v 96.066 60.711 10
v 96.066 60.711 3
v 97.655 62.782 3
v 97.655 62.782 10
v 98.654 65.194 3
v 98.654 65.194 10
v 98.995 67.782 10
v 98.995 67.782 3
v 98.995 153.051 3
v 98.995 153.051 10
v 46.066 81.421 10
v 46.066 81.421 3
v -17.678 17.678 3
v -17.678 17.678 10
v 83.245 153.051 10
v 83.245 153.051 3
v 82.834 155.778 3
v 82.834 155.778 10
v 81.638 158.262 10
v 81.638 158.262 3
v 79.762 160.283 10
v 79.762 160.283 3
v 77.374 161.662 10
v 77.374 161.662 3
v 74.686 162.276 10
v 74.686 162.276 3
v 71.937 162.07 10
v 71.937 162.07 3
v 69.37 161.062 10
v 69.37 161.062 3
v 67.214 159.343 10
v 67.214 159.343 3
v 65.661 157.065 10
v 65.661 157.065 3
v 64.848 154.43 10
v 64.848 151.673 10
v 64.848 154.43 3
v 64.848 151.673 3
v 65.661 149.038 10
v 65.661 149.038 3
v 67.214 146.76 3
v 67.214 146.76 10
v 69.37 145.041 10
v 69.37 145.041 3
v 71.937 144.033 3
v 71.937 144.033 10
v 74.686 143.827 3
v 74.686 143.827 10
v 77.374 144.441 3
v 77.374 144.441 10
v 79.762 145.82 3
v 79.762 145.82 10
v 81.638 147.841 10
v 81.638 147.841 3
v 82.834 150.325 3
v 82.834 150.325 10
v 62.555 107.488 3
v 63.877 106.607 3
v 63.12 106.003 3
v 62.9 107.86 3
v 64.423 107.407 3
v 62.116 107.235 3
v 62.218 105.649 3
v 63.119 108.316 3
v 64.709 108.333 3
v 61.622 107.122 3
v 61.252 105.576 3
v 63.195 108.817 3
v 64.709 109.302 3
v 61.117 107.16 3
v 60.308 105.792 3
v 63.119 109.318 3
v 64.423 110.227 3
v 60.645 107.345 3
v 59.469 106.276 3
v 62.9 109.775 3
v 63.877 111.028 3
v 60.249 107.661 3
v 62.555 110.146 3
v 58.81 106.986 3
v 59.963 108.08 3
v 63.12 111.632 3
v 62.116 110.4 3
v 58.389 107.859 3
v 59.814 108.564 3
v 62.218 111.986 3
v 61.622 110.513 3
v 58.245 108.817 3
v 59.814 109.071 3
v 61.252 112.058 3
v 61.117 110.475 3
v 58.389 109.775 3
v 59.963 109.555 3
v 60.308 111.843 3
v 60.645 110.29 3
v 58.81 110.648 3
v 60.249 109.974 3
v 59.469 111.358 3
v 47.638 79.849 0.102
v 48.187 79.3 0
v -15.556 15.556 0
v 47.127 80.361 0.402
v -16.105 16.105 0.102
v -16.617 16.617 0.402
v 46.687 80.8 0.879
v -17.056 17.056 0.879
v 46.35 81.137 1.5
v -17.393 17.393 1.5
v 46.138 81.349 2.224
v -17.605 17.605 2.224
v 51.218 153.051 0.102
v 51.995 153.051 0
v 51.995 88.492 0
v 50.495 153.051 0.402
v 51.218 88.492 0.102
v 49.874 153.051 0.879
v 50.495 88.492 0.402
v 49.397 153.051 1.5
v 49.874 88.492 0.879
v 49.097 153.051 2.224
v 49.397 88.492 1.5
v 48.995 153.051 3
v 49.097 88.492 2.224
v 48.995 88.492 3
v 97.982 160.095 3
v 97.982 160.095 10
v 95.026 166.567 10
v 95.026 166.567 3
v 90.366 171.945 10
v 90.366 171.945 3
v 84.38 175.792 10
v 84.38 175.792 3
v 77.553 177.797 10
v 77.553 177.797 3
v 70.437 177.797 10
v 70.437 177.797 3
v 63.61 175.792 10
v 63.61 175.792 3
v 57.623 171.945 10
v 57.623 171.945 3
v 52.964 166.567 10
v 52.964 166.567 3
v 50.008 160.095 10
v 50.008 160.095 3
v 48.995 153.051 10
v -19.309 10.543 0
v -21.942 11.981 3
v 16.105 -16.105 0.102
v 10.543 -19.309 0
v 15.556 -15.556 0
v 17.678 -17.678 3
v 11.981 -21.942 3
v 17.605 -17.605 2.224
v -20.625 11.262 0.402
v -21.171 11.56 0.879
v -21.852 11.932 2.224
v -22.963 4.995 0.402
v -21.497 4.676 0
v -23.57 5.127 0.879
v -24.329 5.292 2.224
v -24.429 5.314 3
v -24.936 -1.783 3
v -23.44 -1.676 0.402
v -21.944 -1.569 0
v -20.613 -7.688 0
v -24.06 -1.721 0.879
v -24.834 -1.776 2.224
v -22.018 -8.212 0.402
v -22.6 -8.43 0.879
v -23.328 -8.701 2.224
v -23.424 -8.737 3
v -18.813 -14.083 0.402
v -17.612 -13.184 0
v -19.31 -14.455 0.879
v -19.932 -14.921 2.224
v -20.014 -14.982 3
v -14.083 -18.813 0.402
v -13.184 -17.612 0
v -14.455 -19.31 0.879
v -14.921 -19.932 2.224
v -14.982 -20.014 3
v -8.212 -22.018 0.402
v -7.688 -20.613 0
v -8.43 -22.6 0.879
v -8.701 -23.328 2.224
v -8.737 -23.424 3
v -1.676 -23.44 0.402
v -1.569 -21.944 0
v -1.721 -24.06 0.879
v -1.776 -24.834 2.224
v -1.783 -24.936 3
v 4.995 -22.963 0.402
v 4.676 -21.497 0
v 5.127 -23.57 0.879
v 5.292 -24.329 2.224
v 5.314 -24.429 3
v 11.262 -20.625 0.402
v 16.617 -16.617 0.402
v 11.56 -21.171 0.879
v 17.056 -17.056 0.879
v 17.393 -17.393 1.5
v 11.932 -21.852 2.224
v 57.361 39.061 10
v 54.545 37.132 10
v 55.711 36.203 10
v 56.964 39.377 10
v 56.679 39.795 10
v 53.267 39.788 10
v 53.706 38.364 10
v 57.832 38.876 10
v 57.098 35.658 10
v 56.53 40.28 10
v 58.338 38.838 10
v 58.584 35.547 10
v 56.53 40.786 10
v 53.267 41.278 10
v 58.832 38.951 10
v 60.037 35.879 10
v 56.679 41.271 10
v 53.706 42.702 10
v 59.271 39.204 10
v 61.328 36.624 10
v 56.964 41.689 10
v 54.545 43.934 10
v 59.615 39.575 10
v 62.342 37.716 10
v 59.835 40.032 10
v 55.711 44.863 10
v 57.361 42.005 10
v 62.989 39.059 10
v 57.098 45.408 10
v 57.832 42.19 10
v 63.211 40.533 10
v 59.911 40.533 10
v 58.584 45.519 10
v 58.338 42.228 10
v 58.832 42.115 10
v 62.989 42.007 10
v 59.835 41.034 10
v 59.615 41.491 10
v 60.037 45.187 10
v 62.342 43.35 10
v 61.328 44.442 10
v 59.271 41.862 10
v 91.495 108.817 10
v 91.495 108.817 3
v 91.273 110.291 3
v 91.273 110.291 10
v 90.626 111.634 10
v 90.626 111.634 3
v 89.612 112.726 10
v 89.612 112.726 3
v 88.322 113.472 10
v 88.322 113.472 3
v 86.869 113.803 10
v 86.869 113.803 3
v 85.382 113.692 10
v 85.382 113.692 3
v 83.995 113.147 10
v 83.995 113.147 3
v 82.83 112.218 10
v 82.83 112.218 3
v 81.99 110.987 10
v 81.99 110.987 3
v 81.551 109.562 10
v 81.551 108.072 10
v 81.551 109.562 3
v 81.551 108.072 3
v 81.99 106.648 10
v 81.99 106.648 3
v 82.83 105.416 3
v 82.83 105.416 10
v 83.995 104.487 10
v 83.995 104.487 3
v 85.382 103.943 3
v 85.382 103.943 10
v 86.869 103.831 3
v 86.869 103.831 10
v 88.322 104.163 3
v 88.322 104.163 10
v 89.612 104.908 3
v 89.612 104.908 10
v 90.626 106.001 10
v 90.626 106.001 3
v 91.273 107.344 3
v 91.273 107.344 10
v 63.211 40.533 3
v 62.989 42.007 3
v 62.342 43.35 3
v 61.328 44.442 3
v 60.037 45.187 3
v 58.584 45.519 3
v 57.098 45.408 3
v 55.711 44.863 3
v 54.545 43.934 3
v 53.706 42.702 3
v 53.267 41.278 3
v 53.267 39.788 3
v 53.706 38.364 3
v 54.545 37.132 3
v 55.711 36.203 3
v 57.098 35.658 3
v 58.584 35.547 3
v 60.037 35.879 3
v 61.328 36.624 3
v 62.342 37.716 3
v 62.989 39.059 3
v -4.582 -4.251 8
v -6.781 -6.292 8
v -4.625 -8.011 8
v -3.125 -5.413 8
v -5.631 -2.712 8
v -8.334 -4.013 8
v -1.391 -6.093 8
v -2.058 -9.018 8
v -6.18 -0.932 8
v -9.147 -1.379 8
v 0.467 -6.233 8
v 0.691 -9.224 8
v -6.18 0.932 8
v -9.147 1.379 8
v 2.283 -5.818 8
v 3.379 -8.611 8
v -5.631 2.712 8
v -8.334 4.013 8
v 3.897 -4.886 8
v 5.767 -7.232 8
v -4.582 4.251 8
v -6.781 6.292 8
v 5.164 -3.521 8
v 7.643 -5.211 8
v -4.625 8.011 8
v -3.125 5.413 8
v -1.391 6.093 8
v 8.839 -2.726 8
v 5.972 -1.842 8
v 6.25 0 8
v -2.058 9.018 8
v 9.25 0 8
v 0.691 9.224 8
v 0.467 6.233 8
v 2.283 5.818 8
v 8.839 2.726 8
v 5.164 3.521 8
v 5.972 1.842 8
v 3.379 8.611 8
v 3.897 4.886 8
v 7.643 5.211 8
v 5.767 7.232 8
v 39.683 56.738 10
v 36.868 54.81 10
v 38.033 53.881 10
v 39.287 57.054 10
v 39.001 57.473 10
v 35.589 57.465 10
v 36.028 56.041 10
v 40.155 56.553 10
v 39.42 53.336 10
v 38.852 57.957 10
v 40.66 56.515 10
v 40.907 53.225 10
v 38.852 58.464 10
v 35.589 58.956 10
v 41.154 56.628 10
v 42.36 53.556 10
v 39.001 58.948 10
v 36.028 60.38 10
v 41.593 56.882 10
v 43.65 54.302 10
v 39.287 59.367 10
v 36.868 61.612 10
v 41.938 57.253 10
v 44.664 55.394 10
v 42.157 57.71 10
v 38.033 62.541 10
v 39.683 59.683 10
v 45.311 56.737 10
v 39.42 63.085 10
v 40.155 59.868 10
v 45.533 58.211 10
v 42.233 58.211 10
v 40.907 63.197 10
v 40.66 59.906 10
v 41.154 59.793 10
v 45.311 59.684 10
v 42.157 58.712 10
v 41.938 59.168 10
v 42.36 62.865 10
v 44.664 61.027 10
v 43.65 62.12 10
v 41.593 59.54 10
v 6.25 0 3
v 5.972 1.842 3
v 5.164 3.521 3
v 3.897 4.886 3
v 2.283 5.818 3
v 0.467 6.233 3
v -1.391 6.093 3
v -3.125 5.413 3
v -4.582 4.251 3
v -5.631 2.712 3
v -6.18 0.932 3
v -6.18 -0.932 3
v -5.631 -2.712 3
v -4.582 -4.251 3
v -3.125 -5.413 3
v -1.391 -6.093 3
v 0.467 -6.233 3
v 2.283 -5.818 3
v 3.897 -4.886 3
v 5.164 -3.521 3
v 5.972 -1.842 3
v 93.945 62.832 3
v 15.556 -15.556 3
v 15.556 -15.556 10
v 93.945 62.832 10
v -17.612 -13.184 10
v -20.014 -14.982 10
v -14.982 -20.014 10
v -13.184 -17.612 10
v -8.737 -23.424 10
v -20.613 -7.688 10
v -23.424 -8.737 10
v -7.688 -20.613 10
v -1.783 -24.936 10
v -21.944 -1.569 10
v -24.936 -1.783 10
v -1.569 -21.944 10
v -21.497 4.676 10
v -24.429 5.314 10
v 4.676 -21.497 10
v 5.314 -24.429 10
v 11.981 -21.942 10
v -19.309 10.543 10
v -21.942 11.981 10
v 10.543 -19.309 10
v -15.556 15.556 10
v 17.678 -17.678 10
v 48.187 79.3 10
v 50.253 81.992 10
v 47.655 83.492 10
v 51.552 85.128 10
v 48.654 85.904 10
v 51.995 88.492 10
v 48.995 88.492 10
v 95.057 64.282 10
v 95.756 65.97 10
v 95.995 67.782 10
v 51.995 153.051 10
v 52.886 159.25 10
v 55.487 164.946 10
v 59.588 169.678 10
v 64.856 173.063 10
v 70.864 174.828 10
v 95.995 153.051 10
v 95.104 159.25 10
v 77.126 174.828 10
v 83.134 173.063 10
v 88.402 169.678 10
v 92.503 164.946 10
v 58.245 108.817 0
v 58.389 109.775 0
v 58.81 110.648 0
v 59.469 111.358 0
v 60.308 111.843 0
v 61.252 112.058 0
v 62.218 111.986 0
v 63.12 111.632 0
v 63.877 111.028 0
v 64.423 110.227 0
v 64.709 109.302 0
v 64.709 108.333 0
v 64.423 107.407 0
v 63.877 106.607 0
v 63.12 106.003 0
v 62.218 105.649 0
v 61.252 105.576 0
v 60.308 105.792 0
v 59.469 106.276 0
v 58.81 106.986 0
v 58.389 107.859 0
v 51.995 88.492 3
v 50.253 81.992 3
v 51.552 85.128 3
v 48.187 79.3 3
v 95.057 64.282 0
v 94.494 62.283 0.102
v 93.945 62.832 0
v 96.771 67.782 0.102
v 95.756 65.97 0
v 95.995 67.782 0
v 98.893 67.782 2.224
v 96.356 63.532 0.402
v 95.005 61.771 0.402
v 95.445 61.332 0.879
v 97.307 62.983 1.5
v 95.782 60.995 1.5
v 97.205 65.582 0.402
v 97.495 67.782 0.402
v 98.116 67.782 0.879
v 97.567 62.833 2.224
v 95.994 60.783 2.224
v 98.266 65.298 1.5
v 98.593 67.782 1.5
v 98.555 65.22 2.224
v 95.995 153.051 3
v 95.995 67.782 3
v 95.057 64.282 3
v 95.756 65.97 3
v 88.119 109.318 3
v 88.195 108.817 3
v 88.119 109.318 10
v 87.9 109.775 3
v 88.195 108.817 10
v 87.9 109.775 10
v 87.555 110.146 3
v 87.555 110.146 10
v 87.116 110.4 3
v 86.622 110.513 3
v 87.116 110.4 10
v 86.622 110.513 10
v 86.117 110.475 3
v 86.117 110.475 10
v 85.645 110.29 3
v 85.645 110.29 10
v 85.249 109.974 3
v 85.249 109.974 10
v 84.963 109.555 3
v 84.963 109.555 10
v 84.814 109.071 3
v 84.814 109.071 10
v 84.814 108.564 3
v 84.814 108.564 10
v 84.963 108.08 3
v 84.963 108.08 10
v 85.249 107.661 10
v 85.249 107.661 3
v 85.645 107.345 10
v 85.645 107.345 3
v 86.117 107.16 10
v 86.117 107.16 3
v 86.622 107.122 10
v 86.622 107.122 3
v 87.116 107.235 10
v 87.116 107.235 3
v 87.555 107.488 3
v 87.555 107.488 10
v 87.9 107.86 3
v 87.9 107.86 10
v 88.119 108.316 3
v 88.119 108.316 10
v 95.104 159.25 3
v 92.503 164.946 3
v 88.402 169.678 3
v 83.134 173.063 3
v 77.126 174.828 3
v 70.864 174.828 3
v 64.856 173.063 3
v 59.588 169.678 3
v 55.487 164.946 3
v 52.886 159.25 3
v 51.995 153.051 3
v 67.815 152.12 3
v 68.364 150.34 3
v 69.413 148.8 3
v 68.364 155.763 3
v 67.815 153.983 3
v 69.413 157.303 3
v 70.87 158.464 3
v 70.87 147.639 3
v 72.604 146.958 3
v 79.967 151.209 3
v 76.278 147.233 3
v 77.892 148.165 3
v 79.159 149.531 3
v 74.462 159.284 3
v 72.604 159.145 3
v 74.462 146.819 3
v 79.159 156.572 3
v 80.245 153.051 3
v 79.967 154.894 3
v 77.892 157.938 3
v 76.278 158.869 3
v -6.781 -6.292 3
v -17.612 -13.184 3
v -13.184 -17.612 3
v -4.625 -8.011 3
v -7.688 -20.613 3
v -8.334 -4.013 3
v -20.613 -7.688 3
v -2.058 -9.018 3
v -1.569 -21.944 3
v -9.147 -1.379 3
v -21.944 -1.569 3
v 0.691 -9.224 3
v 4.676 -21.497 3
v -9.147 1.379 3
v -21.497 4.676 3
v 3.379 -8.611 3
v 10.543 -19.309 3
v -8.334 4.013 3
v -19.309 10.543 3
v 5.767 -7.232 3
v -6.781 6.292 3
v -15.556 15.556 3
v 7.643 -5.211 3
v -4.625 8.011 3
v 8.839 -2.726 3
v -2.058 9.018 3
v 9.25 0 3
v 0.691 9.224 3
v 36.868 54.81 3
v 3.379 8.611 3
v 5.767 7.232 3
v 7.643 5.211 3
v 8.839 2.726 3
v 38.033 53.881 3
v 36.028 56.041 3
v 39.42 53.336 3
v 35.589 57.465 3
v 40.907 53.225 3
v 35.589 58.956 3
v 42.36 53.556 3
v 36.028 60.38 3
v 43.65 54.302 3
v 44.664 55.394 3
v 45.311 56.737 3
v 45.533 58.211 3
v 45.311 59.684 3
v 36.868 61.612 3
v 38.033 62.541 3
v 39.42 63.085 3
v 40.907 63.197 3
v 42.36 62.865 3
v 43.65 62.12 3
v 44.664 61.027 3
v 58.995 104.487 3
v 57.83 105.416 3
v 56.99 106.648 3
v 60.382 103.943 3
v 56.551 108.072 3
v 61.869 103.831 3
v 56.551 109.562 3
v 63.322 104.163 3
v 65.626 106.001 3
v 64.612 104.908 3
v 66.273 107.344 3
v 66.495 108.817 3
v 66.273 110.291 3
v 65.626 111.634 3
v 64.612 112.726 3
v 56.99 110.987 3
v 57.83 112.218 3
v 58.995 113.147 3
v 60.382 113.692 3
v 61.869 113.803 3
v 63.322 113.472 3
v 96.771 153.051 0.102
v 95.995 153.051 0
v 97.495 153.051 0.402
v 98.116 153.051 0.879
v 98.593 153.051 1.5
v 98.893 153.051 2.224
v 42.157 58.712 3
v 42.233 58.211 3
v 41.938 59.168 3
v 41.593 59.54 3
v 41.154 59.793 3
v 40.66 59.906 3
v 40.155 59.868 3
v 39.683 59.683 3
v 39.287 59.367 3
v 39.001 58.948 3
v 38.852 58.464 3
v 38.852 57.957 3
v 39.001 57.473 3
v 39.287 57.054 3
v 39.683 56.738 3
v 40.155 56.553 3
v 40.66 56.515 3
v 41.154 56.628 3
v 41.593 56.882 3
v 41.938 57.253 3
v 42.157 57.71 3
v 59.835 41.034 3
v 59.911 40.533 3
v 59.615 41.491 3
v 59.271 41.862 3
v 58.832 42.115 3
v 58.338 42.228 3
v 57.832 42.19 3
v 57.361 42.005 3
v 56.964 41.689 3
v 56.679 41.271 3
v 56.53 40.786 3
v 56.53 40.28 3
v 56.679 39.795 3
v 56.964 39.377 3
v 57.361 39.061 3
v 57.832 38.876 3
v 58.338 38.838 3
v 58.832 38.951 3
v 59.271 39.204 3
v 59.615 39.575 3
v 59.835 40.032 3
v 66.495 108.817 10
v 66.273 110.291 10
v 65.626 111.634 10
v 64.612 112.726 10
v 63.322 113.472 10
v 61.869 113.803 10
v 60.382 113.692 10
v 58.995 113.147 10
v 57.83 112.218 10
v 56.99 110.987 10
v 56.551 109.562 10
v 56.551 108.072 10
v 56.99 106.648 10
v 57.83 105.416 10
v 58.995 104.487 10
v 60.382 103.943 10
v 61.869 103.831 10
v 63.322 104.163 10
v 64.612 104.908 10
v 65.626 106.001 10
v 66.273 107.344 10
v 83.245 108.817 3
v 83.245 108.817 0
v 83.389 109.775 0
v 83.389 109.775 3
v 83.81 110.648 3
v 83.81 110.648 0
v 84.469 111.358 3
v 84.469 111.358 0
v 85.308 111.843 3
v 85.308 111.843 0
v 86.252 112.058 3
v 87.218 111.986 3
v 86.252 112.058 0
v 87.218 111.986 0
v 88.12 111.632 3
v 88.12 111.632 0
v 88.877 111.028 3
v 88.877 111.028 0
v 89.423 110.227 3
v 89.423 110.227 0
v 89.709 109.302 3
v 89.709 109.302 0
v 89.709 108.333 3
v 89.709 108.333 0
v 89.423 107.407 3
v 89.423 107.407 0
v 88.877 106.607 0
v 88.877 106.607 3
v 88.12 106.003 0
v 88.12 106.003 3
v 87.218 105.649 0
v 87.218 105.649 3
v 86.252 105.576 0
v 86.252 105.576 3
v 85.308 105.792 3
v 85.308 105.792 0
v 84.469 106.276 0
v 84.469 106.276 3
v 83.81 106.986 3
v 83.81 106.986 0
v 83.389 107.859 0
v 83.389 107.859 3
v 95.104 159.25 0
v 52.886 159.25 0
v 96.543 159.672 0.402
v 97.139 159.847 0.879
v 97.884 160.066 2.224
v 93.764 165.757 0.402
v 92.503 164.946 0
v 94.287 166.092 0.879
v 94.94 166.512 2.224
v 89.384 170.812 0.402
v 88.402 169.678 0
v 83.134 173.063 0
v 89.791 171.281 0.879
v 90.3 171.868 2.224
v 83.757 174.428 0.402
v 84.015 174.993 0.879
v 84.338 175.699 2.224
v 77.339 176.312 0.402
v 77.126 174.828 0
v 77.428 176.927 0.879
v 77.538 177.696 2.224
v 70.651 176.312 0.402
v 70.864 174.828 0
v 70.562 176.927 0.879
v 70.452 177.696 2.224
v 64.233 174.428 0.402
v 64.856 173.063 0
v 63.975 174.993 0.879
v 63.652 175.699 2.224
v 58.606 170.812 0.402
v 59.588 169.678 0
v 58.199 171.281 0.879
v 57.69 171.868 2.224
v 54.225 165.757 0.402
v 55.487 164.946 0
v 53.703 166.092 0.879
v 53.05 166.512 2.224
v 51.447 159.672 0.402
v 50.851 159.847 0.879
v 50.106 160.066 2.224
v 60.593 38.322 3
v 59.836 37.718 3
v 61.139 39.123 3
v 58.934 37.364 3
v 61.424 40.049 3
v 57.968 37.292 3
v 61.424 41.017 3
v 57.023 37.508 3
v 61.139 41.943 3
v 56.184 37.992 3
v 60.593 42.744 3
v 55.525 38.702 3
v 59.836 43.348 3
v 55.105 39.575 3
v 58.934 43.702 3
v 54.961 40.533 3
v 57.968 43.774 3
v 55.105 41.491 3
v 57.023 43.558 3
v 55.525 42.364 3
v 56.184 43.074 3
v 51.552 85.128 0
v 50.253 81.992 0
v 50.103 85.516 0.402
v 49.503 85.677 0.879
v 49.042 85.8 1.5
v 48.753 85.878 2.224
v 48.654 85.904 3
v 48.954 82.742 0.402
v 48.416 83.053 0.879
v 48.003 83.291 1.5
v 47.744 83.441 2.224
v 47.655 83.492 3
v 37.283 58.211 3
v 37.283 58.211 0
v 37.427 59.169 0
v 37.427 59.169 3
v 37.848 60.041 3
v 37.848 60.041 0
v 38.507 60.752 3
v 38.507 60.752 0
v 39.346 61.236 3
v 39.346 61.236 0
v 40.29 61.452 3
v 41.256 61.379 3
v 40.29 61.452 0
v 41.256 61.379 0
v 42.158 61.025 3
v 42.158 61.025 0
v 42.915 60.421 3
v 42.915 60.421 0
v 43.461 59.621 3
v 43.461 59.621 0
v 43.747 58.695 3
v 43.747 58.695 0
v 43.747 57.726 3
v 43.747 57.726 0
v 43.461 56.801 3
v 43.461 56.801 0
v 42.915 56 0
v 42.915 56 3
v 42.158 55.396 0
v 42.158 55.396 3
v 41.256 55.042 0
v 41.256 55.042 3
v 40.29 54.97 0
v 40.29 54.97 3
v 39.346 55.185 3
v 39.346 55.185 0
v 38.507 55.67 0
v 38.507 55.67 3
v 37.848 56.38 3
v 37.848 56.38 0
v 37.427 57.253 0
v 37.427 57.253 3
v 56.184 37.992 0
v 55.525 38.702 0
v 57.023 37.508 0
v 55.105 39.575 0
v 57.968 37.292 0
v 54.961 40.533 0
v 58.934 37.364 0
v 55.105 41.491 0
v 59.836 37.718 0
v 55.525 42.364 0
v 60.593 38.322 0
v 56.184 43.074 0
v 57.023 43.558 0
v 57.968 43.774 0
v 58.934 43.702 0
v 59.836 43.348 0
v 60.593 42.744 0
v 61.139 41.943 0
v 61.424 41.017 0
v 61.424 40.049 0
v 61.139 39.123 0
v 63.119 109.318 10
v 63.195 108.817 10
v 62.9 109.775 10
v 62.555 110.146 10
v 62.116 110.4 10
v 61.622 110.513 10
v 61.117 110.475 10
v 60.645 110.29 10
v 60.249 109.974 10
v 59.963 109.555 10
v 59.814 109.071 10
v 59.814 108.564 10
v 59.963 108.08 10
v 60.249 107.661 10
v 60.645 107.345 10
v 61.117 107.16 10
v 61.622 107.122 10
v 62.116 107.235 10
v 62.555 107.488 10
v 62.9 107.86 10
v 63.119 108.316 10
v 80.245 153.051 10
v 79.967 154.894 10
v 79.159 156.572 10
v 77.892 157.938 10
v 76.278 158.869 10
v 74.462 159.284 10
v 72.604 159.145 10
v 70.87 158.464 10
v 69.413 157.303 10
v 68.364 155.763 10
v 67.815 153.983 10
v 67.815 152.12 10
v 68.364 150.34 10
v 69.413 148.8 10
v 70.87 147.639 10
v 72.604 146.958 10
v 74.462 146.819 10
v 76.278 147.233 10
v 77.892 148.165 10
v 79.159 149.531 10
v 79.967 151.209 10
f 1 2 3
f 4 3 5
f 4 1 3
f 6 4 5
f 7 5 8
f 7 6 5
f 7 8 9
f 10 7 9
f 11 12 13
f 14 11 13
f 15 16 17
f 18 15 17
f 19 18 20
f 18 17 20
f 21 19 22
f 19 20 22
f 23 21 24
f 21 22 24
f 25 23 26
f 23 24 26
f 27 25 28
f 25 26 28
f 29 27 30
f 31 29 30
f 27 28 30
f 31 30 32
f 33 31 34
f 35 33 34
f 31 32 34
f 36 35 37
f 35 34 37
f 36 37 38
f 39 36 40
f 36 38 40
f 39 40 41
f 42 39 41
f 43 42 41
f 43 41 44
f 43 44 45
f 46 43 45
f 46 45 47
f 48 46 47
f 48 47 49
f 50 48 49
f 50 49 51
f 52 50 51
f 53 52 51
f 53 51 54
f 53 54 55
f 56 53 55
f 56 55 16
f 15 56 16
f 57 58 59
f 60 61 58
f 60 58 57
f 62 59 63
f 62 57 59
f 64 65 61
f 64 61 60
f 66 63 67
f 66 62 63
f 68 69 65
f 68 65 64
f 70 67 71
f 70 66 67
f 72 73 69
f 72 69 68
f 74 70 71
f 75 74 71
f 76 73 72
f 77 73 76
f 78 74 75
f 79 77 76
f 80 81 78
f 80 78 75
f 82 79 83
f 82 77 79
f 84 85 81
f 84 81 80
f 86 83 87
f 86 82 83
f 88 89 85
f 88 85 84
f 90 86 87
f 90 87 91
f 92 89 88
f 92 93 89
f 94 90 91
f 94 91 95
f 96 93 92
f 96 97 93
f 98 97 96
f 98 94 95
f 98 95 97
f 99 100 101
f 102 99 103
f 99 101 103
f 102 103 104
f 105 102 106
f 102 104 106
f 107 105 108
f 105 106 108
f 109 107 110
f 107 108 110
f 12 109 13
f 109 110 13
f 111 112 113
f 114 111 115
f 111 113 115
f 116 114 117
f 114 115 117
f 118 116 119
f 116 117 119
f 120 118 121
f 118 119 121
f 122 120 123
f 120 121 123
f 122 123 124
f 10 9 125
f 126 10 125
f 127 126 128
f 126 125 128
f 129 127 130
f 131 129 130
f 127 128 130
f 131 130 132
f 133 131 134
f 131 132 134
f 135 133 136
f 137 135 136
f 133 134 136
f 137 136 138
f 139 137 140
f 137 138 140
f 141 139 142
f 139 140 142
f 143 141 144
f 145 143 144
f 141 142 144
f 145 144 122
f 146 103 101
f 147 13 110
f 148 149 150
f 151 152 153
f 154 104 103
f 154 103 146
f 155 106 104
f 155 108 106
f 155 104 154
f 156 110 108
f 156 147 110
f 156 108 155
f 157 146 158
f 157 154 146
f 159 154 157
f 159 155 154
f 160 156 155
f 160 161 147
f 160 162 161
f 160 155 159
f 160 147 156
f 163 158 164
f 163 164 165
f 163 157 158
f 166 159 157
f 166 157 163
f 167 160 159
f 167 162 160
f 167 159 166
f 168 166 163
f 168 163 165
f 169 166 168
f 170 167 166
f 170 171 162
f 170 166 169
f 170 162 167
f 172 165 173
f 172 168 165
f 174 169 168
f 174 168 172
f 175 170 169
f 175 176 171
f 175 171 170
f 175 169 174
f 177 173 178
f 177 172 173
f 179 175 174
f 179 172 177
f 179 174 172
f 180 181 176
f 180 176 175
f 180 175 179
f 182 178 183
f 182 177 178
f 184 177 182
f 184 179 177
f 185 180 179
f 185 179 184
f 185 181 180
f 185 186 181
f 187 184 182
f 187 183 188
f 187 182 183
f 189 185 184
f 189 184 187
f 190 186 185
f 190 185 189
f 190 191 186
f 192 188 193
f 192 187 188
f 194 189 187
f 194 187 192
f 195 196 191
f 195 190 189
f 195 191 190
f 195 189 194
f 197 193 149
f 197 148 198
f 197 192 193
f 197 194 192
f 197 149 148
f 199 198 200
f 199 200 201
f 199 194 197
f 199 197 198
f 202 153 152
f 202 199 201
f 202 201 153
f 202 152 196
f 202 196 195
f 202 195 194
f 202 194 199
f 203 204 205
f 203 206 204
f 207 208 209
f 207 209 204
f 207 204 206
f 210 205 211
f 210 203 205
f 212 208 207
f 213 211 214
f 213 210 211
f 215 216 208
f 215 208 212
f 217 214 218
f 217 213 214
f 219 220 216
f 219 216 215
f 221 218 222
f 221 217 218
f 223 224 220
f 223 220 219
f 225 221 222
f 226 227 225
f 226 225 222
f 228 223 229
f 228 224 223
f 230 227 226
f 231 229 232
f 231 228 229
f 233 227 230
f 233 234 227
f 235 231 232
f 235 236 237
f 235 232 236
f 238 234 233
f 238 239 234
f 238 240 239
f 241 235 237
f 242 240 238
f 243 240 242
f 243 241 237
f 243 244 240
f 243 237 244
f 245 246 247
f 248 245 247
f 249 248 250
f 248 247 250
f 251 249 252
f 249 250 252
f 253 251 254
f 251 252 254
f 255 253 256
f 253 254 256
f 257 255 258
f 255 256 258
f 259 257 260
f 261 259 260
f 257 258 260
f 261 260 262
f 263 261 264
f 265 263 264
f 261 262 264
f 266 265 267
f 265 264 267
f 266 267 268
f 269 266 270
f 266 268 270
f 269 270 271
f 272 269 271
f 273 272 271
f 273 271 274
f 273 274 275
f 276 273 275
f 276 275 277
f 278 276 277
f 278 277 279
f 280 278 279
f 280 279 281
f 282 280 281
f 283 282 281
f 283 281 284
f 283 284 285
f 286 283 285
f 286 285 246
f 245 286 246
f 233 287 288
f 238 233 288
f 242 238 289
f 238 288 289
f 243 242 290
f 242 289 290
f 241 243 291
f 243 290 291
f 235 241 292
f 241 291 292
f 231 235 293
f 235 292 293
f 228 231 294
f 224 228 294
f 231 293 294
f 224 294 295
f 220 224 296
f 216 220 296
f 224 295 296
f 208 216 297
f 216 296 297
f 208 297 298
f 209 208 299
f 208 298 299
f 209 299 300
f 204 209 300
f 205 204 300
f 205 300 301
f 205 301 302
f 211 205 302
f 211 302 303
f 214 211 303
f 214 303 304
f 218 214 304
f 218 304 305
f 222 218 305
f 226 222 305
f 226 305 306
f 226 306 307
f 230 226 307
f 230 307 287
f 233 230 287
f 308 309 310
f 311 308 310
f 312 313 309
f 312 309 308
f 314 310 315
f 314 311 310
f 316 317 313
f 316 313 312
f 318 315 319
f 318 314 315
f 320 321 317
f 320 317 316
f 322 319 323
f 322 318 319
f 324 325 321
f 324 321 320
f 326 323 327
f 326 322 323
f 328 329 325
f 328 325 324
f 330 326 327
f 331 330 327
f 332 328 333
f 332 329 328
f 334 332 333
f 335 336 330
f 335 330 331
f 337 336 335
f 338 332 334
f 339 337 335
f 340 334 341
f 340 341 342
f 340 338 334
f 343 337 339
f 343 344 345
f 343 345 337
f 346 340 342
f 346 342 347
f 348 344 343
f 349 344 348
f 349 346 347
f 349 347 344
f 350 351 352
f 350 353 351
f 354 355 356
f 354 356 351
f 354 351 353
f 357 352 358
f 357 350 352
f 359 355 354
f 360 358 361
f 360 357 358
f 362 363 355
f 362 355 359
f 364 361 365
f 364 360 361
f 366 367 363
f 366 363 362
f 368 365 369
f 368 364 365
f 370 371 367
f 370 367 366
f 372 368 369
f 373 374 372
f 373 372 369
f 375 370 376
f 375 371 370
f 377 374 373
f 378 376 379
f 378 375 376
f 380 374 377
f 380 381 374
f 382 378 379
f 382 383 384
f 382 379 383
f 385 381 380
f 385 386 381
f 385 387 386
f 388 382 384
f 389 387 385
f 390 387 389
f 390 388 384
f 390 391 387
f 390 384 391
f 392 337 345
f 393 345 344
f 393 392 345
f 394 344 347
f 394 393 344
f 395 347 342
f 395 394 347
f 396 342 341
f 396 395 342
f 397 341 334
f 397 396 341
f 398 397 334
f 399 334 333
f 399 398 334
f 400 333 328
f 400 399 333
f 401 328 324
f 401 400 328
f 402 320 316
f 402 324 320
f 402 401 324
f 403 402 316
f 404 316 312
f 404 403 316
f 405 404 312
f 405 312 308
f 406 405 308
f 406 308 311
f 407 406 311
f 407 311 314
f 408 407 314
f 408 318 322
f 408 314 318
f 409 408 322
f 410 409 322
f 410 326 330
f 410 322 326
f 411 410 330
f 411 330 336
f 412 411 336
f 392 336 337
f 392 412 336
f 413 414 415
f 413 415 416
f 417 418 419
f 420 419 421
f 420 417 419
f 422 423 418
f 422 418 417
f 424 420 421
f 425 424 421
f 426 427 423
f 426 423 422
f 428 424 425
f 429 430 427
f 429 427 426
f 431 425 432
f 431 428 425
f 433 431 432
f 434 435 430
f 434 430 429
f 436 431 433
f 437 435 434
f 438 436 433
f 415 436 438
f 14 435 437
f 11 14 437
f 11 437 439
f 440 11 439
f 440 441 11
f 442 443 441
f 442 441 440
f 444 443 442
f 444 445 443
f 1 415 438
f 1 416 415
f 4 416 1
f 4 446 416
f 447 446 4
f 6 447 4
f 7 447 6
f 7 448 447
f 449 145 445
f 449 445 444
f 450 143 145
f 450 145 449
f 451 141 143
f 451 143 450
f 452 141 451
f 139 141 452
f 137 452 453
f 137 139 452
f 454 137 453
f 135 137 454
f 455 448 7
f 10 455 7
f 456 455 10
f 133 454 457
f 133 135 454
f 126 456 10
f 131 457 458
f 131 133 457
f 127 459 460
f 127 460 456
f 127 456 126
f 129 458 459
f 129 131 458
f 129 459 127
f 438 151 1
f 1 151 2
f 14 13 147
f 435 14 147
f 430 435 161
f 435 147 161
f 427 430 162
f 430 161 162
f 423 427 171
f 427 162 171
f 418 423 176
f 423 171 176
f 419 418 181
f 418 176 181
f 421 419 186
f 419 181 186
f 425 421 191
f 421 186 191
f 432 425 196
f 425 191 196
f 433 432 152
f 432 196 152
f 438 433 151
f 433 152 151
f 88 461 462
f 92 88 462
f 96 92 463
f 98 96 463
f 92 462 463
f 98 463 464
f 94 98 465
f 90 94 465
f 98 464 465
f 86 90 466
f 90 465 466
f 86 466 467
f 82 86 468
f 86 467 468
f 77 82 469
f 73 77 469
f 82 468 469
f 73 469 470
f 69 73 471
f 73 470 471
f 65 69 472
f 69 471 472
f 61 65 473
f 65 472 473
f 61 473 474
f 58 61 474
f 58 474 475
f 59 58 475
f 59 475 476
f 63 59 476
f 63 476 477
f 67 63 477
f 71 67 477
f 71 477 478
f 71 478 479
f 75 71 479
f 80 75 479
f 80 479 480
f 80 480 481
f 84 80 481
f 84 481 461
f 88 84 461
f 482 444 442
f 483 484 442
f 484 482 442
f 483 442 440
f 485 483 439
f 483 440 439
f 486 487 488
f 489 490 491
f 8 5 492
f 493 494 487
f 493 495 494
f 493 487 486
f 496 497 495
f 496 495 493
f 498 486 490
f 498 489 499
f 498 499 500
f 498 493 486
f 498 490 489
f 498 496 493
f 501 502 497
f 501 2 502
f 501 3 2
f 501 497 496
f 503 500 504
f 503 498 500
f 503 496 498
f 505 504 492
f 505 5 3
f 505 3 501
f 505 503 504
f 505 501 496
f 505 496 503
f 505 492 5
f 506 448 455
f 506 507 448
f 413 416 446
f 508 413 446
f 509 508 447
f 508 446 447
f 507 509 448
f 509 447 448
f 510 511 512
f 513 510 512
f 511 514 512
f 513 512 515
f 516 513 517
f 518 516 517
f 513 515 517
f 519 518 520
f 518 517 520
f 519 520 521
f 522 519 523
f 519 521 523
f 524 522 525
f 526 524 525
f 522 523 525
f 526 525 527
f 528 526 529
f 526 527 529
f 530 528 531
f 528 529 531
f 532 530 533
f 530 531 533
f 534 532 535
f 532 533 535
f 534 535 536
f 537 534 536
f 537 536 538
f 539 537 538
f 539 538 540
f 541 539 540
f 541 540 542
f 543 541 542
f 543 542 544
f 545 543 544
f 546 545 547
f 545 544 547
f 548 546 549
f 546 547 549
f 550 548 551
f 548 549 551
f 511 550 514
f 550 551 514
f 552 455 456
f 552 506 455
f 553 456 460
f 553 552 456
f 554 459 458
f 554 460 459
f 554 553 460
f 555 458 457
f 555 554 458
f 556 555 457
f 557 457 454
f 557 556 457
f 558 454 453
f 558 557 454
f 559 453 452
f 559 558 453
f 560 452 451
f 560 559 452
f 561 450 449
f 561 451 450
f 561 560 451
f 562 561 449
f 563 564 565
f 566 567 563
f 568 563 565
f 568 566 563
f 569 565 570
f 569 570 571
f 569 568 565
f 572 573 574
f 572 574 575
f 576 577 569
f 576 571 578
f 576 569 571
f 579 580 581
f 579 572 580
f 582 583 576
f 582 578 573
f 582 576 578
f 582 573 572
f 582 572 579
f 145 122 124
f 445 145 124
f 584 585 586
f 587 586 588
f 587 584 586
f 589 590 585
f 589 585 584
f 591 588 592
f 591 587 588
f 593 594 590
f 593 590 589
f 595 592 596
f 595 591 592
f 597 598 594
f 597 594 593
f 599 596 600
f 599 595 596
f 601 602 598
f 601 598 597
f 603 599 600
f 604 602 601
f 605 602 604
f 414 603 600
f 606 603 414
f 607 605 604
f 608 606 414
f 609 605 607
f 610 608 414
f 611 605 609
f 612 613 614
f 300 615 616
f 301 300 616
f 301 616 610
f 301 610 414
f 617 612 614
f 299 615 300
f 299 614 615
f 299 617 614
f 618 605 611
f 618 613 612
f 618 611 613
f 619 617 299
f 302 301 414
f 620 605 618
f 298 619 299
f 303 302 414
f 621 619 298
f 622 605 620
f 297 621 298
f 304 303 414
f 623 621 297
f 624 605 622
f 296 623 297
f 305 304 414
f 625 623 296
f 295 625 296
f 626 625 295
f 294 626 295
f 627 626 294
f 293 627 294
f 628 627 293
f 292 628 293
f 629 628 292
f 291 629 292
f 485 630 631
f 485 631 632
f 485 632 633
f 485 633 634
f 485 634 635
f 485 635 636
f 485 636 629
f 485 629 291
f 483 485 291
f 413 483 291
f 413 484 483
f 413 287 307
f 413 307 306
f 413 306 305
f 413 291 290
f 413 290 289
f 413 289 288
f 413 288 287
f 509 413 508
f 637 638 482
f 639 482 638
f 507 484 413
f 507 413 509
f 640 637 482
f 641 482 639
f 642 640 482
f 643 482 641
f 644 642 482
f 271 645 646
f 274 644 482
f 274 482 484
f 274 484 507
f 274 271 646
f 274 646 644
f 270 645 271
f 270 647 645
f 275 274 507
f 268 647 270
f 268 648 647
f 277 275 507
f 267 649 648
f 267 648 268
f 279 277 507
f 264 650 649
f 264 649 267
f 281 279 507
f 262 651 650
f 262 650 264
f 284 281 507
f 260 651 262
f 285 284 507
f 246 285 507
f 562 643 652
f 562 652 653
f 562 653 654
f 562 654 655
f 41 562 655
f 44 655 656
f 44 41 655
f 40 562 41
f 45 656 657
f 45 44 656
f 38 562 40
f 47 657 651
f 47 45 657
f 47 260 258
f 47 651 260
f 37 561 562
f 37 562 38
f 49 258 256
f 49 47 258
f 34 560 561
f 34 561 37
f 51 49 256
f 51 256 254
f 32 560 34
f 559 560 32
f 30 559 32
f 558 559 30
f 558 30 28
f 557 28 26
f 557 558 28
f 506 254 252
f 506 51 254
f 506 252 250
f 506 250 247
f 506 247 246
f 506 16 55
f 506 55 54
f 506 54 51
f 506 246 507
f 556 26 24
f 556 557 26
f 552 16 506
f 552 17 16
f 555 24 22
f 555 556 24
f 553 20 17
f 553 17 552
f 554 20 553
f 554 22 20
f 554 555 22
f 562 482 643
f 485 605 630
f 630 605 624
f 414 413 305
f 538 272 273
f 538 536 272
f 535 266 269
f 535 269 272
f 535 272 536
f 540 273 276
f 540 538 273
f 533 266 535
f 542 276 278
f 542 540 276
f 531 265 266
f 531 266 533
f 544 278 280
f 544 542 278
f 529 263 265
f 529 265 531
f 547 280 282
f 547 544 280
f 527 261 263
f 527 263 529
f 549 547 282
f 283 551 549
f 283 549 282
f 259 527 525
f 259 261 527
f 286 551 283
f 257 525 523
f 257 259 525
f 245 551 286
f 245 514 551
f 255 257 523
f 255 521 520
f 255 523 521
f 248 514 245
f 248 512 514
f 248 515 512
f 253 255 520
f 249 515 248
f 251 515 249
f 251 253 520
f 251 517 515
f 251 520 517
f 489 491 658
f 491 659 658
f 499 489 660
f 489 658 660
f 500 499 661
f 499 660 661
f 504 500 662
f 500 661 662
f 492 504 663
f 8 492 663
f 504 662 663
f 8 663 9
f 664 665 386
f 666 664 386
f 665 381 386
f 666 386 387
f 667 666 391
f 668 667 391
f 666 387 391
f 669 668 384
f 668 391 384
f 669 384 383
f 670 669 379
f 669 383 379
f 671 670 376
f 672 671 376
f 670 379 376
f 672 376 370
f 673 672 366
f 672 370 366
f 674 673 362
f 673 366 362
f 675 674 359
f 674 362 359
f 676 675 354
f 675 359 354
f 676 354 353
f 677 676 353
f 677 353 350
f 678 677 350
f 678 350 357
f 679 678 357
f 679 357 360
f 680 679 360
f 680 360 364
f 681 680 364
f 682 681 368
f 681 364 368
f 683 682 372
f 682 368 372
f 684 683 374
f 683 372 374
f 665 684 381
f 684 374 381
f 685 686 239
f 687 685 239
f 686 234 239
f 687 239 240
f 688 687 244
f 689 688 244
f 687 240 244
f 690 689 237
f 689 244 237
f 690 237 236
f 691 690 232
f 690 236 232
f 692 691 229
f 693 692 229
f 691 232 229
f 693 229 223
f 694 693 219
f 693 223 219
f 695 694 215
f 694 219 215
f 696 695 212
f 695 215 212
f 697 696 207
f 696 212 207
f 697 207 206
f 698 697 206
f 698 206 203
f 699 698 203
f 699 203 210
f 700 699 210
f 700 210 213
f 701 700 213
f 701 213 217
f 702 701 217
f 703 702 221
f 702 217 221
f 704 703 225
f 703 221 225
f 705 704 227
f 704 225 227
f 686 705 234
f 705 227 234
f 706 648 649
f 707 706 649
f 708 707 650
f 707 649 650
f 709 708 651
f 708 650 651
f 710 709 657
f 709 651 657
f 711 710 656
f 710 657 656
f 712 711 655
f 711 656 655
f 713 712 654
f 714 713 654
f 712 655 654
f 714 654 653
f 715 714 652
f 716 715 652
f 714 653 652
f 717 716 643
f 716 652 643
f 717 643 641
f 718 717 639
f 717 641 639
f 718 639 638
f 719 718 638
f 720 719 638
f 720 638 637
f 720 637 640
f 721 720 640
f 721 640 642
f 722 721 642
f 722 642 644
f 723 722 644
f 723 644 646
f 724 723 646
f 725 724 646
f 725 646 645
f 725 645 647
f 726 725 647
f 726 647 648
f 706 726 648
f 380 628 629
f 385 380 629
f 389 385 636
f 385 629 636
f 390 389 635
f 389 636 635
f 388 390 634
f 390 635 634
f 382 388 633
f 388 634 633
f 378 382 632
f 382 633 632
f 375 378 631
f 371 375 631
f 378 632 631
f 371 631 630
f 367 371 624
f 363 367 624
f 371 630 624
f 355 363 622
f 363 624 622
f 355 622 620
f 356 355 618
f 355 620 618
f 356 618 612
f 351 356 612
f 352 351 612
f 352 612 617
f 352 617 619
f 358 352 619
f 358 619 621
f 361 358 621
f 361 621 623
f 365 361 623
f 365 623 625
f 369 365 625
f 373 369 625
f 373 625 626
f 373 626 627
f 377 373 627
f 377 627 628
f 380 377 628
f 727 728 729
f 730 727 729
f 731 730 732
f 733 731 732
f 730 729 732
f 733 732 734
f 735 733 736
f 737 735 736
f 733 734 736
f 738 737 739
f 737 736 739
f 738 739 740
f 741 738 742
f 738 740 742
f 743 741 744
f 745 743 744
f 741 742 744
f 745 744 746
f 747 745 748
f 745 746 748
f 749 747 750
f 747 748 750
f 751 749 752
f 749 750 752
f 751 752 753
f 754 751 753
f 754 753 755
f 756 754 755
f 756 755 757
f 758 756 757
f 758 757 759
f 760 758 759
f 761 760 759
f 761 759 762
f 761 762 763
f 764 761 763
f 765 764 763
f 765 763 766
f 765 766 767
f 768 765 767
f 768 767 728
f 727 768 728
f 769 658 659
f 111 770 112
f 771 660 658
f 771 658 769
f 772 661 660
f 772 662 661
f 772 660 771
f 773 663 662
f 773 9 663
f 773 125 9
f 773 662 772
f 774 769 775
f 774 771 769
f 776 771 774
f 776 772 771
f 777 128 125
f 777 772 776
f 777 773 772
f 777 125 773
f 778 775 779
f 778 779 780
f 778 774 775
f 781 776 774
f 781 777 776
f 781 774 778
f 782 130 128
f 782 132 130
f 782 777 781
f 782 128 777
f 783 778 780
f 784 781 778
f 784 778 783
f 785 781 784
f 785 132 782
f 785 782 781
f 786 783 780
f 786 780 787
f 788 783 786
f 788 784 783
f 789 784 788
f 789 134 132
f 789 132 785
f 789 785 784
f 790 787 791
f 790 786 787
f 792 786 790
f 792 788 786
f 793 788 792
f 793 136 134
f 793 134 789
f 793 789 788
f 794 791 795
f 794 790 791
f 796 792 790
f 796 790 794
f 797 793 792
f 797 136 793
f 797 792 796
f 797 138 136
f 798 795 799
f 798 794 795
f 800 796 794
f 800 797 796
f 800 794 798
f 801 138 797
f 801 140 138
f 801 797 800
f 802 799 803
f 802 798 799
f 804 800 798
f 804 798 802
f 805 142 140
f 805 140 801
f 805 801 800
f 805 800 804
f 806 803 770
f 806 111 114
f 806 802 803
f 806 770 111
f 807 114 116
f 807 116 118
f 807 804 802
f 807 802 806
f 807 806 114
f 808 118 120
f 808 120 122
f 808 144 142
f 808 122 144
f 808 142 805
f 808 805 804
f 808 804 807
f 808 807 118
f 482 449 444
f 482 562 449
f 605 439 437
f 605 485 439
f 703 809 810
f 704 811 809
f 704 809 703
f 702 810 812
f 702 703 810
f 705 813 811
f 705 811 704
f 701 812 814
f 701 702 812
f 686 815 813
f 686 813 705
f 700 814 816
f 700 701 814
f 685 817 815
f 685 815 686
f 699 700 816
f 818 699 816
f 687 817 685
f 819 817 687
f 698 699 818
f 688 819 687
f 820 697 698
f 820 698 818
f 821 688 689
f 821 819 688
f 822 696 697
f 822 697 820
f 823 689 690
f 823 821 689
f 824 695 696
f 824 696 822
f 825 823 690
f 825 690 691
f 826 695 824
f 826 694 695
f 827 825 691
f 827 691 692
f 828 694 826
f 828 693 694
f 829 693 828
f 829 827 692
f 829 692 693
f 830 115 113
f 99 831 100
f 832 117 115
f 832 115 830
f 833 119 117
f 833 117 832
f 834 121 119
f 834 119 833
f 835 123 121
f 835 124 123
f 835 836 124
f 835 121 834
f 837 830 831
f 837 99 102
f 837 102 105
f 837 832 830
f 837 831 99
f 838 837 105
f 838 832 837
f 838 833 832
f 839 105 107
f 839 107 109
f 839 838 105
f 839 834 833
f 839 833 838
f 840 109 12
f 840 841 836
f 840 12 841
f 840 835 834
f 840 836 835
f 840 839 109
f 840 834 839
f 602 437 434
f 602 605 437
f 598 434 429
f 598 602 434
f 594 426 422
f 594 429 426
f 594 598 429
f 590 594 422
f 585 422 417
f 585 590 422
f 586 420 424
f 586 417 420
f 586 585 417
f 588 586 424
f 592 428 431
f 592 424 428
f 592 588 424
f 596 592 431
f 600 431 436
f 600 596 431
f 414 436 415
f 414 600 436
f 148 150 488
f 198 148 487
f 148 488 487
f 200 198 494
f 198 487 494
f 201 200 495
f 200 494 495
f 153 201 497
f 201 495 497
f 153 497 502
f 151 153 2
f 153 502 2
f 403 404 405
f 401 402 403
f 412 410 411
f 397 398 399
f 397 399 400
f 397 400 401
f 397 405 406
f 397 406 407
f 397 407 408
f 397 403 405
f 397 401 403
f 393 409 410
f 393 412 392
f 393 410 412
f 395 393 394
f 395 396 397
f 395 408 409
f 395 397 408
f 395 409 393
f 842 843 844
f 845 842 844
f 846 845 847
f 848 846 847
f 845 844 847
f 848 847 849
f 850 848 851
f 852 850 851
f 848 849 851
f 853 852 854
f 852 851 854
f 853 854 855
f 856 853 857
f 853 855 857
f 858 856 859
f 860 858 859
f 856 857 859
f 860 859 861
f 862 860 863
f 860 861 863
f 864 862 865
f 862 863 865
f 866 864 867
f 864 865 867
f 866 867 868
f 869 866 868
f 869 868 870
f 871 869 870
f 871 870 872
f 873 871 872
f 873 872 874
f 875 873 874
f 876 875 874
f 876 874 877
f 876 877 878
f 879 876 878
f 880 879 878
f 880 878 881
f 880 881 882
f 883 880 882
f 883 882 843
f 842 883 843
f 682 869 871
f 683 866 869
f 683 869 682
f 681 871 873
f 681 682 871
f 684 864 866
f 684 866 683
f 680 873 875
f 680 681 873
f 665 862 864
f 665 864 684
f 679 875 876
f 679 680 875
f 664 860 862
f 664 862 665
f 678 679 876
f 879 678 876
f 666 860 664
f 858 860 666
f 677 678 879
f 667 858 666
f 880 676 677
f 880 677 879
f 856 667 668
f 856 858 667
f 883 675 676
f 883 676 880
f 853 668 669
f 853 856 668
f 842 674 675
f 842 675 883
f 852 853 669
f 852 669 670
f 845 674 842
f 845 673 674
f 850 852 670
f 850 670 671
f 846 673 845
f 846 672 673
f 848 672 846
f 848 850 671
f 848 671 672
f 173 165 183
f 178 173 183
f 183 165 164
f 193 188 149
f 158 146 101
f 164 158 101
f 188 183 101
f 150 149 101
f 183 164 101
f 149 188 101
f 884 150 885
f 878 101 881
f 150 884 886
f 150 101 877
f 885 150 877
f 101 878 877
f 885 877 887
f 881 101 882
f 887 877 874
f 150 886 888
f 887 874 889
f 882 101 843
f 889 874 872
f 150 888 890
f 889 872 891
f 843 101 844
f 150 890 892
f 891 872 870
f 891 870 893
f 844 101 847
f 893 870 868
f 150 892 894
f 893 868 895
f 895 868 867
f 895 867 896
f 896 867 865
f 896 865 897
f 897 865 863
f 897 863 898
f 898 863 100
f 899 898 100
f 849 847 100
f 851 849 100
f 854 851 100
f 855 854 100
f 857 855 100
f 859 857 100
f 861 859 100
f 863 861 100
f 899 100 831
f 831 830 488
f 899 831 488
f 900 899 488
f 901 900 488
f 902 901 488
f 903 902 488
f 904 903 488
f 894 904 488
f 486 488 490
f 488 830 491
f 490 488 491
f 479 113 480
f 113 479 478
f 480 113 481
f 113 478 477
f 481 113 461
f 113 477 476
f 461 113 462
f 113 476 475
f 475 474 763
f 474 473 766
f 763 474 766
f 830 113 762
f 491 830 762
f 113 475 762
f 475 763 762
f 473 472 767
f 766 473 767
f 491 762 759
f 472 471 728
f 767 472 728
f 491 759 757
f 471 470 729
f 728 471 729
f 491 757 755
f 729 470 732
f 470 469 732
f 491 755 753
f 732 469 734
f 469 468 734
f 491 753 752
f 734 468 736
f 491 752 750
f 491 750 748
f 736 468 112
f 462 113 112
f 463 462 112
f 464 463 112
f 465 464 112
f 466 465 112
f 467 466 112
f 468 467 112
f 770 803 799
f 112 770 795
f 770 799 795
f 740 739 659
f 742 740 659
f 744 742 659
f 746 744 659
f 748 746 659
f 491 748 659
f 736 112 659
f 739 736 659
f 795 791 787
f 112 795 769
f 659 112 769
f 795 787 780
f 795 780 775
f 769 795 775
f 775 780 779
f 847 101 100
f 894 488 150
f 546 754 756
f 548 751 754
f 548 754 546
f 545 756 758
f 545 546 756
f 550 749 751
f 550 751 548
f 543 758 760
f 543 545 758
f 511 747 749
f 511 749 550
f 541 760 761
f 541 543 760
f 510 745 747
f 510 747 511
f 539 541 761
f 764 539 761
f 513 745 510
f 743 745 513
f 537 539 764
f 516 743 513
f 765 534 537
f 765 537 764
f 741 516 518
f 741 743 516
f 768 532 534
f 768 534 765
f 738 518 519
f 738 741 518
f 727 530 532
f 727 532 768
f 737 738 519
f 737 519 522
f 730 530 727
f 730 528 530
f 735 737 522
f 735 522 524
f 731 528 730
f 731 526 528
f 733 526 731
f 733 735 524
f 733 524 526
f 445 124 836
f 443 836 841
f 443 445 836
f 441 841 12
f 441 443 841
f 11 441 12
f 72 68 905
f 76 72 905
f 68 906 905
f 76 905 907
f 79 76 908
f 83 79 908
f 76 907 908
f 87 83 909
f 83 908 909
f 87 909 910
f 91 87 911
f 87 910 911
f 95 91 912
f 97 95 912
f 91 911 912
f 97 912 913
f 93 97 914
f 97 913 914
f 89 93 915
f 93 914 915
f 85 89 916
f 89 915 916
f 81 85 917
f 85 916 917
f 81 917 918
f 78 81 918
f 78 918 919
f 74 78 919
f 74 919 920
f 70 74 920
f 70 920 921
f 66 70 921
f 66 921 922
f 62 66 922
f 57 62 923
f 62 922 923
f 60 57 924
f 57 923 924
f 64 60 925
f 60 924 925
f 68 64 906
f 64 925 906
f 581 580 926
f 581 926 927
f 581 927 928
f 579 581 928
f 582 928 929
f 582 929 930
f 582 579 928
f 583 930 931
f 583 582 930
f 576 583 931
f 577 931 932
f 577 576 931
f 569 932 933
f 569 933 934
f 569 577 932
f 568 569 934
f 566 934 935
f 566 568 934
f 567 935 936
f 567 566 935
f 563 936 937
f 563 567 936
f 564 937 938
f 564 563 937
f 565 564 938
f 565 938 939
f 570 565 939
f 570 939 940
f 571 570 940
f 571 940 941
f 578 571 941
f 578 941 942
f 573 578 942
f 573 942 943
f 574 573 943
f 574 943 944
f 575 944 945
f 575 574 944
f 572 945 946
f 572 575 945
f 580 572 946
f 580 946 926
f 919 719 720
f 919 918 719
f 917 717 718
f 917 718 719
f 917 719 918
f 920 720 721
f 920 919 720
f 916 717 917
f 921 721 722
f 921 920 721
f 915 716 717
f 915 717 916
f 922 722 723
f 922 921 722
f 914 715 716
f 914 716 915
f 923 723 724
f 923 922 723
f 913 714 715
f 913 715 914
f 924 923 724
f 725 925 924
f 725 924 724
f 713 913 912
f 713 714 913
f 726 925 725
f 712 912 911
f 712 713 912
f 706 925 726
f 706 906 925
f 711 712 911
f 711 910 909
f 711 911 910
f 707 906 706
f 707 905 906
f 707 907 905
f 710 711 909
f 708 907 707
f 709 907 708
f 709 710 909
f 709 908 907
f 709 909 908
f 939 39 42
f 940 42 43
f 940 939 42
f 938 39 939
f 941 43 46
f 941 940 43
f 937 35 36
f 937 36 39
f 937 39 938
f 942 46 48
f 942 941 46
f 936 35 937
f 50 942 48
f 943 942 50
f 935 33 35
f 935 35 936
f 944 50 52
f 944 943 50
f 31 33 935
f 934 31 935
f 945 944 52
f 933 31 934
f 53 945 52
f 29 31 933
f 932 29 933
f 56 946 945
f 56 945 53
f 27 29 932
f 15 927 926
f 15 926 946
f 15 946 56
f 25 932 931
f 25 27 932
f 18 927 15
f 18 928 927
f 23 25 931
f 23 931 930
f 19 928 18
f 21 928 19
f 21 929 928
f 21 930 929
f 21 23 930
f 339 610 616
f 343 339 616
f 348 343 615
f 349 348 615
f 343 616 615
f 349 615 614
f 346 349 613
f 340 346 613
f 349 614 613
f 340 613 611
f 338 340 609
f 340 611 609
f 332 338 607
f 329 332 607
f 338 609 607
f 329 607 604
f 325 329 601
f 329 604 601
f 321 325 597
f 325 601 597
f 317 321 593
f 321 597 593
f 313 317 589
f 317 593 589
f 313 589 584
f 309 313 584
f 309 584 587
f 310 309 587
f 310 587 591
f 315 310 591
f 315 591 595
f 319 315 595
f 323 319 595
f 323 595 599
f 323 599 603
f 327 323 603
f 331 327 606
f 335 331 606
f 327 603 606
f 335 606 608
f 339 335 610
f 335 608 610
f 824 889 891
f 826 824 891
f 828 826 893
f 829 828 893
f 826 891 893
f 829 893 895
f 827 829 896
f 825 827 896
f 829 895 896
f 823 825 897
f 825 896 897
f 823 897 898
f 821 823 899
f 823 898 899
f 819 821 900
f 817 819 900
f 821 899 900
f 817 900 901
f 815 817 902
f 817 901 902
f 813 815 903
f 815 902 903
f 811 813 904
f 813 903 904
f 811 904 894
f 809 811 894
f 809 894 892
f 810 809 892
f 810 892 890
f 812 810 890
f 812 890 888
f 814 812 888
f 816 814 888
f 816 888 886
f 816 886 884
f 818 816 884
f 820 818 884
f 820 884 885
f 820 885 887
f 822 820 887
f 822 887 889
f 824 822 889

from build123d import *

# Parameters (mm, degrees)
BOSS_EXTRUDE1_DEPTH                          = 10
FILLET1_R                                    = 10
SHELL1_T                                     = -3
FILLET4_R                                    = 3
SKETCH2_R                                    = 9.25
BOSS_EXTRUDE2_DEPTH                          = 5
BOSS_EXTRUDE5_START                          = -3
SKETCH18_R                                   = 9.25
BOSS_EXTRUDE5_DEPTH                          = 10
SHELL2_START                                 = 3
SHELL2_OUTLINE_R                             = 6.25
SHELL2_DEPTH                                 = 7
SKETCH17_R                                   = 5
BOSS_EXTRUDE4_DEPTH                          = 10
CBORE_FOR_M5_HEX_HEAD_CAP_SCREW3_D           = 3.4
CBORE_FOR_M5_HEX_HEAD_CAP_SCREW3_CBORE_D     = 6.5
CBORE_FOR_M5_HEX_HEAD_CAP_SCREW3_CBORE_DEPTH = 3


# Read off the part's stored shape, not the designer's step: Shell2
with BuildPart() as part:
    # Sketch1 → Boss-Extrude1 (new body)
    with BuildSketch(Plane.XY):
        with BuildLine():
            Line((17.67766953, -17.67766953), (98.994949366, 63.639610307))
            Line((98.994949366, 63.639610307), (98.994949366, 153.051453663))
            ThreePointArc((98.994949366, 153.051453663), (73.994949366, 178.051453663), (48.994949366, 153.051453663))
            Line((48.994949366, 153.051453663), (48.994949366, 84.350288425))
            Line((48.994949366, 84.350288425), (-17.67766953, 17.67766953))
            ThreePointArc((-17.67766953, 17.67766953), (-17.67766953, -17.67766953), (17.67766953, -17.67766953))
        make_face()
    extrude(amount=BOSS_EXTRUDE1_DEPTH)

    # Fillet1
    fillet1_edges = [part.edges().sort_by_distance(p)[0] for p in [
        (48.994949366, 84.350288425, 5),
        (98.994949366, 63.639610307, 5),
    ]]
    fillet(fillet1_edges, radius=FILLET1_R)

    # Shell1
    shell1_openings = [part.faces().sort_by_distance(p)[0] for p in [
        (50.162308395, 71.072674162, 10),
    ]]
    offset(amount=SHELL1_T, openings=shell1_openings, kind=Kind.INTERSECTION)

    # Fillet4
    fillet4_edges = [part.edges().sort_by_distance(p)[0] for p in [
        (98.994949366, 110.416599797, 0),
        (14.194173824, 49.549512883, 0),
        (98.233744691, 63.954911607, 0),
        (48.233744691, 84.665589726, 0),
        (48.994949366, 120.771938856, 0),
        (73.994949366, 178.051453663, 0),
        (56.871843354, 21.516504294, 0),
        (-17.67766953, -17.67766953, 0),
    ]]
    fillet(fillet4_edges, radius=FILLET4_R)

    # Sketch2 → Boss-Extrude2 (add)
    with BuildSketch(Plane.XY.offset(3)):
        Circle(SKETCH2_R)
    extrude(amount=BOSS_EXTRUDE2_DEPTH)

    # Sketch18 → Boss-Extrude5 (add)
    with BuildSketch(Plane.XY.offset(3).offset(BOSS_EXTRUDE5_START)):
        with Locations((73.994949366, 153.051453663)):
            Circle(SKETCH18_R)
    extrude(amount=BOSS_EXTRUDE5_DEPTH)

    # Shell2 outline → Shell2 (cut)
    with BuildSketch(Plane.XY.offset(SHELL2_START)):
        with Locations((73.994949366, 153.051453663)):
            Circle(SHELL2_OUTLINE_R)
        Circle(SHELL2_OUTLINE_R)
    extrude(amount=SHELL2_DEPTH, mode=Mode.SUBTRACT)

    # Sketch17 → Boss-Extrude4 (add)
    with BuildSketch(Plane.XY):
        with Locations((40.533008589, 58.210678119)):
            Circle(SKETCH17_R)
        with Locations((61.494949366, 108.817279836)):
            Circle(SKETCH17_R)
        with Locations((86.494949366, 108.817279836)):
            Circle(SKETCH17_R)
        with Locations((58.210678119, 40.533008589)):
            Circle(SKETCH17_R)
    extrude(amount=BOSS_EXTRUDE4_DEPTH)

    # CBORE for M5 Hex Head Cap Screw3 (through all)
    with Locations(Plane(origin=(0, 0, 0), x_dir=(-1, 0, 0), z_dir=(0, 0, -1))):
        with Locations((-86.494949366, 108.817279836), (-61.494949366, 108.817279836), (-58.210678119, 40.533008589), (-40.533008589, 58.210678119)):
            CounterBoreHole(CBORE_FOR_M5_HEX_HEAD_CAP_SCREW3_D / 2, CBORE_FOR_M5_HEX_HEAD_CAP_SCREW3_CBORE_D / 2, CBORE_FOR_M5_HEX_HEAD_CAP_SCREW3_CBORE_DEPTH)


solid = part.part
